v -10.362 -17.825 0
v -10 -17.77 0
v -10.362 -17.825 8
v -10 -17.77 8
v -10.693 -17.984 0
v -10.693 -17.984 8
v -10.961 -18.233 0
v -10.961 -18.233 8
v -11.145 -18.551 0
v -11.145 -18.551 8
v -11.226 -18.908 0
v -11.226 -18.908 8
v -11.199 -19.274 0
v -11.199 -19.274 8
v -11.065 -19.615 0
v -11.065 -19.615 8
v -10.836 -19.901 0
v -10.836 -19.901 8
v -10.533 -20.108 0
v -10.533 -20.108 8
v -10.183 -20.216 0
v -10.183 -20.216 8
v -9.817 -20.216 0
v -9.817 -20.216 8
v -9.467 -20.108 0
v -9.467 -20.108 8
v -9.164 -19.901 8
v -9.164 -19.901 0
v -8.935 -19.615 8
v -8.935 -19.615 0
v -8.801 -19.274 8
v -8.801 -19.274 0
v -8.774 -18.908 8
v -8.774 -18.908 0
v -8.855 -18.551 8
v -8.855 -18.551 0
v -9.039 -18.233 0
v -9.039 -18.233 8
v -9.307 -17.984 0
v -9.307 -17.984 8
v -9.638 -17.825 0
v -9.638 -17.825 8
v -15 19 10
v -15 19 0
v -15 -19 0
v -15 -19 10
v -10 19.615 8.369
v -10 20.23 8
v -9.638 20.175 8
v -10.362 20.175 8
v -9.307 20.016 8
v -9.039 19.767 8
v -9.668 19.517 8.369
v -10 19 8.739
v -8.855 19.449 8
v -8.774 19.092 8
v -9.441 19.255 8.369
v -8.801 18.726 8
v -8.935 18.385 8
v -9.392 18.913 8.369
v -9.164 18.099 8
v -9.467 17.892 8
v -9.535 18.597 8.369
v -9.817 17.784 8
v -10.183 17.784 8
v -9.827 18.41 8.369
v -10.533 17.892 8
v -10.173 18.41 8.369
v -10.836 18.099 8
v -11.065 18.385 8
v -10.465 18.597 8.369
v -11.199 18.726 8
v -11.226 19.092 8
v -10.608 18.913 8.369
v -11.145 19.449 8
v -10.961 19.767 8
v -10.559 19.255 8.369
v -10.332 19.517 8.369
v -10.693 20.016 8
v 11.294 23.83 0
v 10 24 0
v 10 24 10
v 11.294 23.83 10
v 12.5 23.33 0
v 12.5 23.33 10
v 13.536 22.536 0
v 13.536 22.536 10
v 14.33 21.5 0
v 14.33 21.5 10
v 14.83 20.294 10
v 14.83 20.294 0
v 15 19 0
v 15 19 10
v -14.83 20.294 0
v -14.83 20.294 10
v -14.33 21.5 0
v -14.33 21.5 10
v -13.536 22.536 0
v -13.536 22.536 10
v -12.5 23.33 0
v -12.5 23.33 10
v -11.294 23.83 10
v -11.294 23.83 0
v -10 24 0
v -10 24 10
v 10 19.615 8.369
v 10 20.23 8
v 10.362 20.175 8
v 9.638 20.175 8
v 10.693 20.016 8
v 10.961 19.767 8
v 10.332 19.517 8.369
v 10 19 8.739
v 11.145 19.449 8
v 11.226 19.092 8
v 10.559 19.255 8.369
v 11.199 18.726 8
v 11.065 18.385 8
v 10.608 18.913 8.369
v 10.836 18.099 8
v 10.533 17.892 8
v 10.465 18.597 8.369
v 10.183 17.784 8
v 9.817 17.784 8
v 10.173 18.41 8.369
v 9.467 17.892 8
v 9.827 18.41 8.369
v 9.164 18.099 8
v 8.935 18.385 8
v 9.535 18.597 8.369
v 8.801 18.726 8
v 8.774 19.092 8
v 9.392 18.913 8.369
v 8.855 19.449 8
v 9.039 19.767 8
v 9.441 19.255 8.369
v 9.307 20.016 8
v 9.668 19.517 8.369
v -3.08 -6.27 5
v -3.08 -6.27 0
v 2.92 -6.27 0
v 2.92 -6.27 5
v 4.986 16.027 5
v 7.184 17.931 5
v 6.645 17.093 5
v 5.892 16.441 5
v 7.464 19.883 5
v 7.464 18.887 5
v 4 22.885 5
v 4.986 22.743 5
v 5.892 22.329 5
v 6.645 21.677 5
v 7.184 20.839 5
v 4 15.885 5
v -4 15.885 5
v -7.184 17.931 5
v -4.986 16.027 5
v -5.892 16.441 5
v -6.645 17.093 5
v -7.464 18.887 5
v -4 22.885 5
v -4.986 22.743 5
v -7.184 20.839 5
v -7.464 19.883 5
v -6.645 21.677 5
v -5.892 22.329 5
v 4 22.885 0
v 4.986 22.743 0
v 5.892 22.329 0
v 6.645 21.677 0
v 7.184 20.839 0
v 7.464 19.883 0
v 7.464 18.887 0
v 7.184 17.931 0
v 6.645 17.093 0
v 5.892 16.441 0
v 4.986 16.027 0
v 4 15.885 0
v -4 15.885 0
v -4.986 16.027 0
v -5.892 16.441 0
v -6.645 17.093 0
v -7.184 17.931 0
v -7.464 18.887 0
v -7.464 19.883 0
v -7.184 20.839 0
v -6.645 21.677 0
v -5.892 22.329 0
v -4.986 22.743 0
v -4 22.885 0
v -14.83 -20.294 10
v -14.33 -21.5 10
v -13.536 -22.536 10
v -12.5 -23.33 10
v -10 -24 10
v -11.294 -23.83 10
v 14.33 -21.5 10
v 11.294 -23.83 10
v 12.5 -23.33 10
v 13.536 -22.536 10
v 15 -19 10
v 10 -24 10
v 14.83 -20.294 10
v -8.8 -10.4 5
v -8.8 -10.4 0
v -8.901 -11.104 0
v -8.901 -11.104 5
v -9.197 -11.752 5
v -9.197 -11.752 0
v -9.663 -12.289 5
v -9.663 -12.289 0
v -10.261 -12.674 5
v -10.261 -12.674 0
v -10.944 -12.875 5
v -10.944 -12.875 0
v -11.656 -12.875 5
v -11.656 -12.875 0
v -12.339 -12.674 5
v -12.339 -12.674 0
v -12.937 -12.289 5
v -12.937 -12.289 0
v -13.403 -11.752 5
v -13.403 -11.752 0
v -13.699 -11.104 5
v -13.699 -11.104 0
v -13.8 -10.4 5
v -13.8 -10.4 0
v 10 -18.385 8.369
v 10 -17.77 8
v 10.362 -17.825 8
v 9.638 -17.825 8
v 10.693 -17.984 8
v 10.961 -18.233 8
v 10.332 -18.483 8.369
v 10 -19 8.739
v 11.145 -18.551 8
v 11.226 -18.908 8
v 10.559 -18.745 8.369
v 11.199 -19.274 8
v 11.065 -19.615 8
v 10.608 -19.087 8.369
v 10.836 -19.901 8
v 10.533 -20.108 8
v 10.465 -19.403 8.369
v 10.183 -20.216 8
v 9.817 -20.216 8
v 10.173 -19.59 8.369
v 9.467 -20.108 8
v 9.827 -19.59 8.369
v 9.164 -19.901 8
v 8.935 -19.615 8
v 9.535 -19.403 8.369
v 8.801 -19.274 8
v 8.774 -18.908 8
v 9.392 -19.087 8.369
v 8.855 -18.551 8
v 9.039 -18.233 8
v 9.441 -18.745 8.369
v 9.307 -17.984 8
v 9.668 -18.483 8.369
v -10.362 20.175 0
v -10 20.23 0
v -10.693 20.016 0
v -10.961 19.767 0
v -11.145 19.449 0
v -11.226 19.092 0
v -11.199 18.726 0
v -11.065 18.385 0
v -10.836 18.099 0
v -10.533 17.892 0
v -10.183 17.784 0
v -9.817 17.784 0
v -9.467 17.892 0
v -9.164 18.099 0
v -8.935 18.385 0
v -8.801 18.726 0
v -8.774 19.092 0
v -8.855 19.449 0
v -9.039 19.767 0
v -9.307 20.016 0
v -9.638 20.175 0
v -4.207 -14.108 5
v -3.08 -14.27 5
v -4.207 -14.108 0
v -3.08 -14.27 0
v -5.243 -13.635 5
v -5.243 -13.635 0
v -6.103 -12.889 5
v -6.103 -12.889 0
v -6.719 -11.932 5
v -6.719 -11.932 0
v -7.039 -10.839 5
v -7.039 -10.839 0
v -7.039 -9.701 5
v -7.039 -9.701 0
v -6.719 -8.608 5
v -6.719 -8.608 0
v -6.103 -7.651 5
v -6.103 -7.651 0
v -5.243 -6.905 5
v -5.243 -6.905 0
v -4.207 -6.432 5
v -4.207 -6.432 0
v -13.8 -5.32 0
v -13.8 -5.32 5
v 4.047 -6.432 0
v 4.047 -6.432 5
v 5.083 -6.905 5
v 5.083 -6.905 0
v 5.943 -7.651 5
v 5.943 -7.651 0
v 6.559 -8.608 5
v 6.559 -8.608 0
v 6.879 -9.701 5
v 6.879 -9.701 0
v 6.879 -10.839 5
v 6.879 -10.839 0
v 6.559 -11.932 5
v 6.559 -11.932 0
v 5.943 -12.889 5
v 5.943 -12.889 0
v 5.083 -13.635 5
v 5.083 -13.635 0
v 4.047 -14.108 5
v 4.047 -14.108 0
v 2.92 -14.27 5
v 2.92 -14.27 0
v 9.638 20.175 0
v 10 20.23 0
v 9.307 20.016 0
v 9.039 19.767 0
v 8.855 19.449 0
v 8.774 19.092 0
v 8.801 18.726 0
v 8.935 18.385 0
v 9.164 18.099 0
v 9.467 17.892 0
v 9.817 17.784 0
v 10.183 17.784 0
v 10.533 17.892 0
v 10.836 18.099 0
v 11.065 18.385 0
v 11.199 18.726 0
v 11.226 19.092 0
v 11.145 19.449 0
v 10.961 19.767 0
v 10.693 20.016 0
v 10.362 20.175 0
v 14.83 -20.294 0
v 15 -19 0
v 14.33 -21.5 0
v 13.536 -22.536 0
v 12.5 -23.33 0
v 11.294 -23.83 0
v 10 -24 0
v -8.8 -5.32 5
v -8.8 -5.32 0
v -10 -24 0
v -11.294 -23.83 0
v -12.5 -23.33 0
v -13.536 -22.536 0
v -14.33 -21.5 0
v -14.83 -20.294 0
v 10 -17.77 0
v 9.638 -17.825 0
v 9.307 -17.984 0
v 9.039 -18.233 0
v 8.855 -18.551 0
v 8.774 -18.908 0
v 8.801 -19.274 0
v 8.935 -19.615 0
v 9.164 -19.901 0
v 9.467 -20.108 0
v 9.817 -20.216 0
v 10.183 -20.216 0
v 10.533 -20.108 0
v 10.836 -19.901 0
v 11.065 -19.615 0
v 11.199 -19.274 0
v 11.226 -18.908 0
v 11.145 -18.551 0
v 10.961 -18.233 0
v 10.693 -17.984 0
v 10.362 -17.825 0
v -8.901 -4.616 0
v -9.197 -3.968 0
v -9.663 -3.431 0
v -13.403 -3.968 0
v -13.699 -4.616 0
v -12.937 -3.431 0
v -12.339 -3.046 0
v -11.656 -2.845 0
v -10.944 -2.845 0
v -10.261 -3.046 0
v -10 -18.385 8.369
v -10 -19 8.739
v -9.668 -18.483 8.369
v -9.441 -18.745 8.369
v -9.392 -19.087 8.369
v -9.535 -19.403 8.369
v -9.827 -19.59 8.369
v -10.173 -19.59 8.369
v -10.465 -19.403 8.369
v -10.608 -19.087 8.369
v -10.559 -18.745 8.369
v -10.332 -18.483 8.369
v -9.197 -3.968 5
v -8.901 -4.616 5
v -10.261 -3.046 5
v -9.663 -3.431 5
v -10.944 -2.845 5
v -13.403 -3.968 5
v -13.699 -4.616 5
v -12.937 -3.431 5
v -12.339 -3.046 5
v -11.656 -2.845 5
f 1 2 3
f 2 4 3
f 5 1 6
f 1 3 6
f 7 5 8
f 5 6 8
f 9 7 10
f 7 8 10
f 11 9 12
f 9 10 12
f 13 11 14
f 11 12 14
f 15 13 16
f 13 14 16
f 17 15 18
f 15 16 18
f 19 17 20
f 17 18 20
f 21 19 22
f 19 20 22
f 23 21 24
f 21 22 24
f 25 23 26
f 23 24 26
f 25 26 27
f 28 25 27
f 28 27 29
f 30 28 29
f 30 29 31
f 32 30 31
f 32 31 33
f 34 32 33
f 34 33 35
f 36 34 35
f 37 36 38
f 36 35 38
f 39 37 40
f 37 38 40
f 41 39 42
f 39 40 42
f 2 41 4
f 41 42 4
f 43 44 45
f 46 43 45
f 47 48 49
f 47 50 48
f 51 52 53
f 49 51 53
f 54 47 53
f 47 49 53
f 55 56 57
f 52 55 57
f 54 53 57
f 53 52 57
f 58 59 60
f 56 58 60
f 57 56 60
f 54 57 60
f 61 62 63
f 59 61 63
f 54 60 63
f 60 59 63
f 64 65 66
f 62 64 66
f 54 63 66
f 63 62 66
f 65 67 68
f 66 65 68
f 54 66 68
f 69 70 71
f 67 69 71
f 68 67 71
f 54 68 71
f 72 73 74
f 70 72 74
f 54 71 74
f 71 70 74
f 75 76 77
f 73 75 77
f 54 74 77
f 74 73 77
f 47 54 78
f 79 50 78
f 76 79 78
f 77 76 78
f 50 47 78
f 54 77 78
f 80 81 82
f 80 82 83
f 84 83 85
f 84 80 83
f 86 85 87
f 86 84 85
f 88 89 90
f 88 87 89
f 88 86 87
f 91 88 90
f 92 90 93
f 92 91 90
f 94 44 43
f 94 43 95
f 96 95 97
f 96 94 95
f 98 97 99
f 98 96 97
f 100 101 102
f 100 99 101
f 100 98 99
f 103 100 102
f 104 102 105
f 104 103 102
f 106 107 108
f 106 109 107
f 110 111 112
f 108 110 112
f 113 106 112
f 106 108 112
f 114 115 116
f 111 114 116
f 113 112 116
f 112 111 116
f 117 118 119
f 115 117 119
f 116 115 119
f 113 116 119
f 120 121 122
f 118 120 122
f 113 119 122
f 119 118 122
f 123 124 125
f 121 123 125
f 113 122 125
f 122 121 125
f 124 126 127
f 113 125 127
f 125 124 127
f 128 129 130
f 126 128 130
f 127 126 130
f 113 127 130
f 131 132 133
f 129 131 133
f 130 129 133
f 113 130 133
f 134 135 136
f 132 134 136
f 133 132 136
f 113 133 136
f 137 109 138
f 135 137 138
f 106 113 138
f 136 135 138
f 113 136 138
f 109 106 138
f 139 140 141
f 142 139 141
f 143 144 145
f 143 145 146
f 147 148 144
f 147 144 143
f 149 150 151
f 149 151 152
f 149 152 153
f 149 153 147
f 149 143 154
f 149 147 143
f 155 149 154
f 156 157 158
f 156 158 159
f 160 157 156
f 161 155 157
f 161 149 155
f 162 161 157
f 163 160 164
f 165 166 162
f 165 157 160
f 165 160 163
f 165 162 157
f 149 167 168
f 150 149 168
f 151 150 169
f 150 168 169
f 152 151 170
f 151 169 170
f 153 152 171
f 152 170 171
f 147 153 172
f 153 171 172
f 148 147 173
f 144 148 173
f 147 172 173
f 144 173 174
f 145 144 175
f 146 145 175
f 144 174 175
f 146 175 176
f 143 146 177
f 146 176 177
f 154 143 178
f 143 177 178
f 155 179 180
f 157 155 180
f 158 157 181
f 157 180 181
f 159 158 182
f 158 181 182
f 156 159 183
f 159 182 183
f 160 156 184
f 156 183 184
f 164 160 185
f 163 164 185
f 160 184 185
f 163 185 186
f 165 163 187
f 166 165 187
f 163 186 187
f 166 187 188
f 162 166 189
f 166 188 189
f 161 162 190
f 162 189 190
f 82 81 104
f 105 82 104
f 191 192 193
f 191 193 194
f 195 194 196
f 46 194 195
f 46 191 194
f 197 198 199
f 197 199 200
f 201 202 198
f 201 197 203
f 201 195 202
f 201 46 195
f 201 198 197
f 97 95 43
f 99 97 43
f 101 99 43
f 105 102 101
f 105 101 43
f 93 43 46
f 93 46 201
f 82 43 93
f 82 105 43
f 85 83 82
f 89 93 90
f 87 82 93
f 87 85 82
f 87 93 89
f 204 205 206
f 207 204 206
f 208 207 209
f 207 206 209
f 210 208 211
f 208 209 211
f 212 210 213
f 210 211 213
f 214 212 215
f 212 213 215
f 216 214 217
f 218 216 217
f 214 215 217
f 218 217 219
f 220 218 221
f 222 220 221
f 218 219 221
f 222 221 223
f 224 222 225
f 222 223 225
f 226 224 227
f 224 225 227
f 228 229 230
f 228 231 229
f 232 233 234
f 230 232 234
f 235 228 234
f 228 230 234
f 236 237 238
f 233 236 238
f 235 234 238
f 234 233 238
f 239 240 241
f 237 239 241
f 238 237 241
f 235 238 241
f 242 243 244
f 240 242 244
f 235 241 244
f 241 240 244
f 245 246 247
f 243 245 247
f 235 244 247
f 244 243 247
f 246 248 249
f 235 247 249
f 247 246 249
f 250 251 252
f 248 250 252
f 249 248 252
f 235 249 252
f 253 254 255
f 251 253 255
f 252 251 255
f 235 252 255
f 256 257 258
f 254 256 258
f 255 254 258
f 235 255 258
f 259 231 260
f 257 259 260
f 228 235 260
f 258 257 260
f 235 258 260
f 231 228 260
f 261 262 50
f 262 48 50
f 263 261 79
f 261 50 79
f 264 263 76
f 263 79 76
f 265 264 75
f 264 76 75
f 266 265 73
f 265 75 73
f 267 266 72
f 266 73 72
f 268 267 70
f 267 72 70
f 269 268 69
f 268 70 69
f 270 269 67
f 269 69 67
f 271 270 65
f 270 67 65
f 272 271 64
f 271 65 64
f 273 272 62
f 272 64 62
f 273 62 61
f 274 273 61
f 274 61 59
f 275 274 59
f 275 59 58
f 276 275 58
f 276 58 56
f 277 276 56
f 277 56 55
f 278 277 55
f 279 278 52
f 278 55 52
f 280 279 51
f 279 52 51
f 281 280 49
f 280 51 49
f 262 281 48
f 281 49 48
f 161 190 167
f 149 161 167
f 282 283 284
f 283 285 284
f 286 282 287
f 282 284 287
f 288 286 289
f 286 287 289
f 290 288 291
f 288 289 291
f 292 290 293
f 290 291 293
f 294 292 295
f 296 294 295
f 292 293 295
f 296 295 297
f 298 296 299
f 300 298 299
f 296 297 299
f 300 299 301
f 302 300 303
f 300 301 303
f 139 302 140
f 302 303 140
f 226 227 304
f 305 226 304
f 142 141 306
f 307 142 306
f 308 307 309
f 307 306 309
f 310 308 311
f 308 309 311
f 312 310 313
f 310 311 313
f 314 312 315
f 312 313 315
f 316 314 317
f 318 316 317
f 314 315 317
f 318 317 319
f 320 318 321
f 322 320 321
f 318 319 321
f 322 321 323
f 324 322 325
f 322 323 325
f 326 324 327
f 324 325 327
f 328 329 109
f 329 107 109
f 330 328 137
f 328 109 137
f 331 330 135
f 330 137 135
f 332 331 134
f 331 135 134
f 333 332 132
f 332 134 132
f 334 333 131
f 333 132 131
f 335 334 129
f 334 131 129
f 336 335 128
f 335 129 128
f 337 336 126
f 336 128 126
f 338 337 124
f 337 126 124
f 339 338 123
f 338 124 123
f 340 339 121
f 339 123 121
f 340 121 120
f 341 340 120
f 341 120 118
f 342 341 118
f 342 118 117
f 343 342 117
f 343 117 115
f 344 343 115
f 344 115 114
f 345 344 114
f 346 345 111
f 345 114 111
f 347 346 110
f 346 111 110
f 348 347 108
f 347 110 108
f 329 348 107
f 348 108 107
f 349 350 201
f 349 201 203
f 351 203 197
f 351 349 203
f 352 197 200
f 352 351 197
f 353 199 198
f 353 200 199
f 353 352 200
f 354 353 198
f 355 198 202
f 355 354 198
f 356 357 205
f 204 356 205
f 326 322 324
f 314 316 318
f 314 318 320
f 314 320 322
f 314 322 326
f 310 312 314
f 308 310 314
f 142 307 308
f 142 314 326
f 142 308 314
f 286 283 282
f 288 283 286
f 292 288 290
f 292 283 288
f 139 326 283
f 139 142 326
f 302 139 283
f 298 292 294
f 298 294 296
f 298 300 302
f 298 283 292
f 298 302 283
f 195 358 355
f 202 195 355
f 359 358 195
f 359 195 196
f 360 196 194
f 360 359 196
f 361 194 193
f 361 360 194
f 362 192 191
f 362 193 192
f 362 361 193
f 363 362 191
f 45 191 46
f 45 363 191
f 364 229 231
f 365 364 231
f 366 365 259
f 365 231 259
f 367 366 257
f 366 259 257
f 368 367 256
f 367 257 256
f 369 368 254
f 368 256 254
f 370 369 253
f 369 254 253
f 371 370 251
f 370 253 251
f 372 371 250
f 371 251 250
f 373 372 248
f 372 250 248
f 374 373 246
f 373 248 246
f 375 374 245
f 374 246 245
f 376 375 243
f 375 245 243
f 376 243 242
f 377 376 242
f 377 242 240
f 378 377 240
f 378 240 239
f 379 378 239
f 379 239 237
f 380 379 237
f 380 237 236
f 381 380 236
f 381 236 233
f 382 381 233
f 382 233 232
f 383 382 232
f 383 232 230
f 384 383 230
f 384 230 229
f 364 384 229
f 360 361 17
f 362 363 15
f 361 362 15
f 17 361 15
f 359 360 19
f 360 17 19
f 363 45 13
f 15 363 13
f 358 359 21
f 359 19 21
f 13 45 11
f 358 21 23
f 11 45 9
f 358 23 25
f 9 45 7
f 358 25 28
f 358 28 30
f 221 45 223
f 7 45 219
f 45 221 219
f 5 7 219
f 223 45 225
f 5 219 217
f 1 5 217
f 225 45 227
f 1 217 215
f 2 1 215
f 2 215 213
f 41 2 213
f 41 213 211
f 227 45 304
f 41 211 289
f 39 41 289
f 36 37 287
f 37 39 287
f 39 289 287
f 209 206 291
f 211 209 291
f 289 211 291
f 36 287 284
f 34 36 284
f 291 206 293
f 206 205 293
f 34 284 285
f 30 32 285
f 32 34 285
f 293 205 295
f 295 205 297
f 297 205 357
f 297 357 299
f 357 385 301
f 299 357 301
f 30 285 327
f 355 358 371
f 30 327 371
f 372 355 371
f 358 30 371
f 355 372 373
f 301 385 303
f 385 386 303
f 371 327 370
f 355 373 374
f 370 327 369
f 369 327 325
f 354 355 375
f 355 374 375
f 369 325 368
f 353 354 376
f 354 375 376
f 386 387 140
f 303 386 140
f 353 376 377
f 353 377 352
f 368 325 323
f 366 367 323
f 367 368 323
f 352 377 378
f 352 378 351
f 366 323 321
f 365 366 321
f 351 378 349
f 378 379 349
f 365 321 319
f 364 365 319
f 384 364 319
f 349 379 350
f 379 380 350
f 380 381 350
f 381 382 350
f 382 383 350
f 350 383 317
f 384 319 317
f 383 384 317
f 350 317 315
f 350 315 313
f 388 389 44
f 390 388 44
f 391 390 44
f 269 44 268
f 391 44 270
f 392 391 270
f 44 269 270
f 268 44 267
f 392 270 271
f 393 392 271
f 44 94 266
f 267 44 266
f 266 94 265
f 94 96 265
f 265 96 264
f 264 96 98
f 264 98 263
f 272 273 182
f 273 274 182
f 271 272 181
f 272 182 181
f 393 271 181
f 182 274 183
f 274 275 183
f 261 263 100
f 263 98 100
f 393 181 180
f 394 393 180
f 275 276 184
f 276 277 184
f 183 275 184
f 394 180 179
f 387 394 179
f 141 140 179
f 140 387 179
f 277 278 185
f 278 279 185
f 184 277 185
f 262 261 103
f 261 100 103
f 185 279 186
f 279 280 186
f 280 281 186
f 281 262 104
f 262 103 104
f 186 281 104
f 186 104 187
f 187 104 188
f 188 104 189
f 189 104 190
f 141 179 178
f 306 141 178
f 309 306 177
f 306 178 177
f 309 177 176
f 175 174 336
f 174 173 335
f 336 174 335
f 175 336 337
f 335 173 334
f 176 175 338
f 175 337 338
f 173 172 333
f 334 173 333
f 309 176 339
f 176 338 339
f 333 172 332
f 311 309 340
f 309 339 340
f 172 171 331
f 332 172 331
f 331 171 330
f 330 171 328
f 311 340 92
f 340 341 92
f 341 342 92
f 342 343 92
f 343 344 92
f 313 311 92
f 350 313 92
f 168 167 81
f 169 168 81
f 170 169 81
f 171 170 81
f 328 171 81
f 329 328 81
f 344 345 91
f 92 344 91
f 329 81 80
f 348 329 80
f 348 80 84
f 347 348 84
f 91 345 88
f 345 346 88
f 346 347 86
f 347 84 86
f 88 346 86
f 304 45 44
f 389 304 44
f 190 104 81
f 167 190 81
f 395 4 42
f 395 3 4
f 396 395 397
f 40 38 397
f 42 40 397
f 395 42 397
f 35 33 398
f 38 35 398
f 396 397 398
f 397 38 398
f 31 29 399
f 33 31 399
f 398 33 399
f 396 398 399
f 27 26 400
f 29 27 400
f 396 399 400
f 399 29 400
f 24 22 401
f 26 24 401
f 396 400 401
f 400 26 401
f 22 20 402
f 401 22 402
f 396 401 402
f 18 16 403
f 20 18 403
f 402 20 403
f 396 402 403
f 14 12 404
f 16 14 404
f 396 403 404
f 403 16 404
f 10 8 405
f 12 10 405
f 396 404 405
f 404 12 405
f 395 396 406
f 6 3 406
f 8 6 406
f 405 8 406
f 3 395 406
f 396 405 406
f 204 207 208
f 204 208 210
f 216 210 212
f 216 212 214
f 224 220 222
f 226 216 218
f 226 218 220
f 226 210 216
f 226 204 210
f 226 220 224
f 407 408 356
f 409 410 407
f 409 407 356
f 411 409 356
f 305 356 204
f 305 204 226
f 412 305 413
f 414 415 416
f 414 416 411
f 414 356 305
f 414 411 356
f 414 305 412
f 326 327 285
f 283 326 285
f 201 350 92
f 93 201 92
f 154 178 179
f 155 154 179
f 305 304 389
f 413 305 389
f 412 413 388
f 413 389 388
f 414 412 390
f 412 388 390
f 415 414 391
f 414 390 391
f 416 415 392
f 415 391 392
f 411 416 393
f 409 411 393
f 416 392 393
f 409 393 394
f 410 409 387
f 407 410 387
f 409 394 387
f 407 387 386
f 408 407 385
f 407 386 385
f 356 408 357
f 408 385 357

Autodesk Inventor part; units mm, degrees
ref_plane "YZ Plane" through (0, 0, 0) normal (1, 0, 0) x (0, 1, 0)
ref_plane "XZ Plane" through (0, 0, 0) normal (0, 1, 0) x (-1, 0, 0)
ref_plane "XY Plane" through (0, 0, 0) normal (0, 0, 1) x (1, 0, 0)
sketch "Sketch1" plane through (0, 0, 0) normal (0, 0, 1) x (1, 0, 0)
  line L0 (-15, 19) -> (-15, -19) projected
  arc A0 (-10, 24) -> (-15, 19) centre (-10, 19) ccw projected
  line L1 (10, 24) -> (-10, 24) projected
  arc A1 (15, 19) -> (10, 24) centre (10, 19) ccw projected
  line L2 (15, -19) -> (15, 19) projected
  arc A2 (10, -24) -> (15, -19) centre (10, -19) ccw projected
  line L3 (-10, -24) -> (10, -24) projected
  arc A3 (-15, -19) -> (-10, -24) centre (-10, -19) ccw projected
  point P0 (0, 0)
extrude "Extrusion1" add sketch "Sketch1" along normal blind 10
sketch "Sketch2" plane through (0, 0, 0) normal (0, 0, -1) x (-1, 0, 0)
  circle A0 centre (-10, 19) radius 1.6 projected
  circle A1 centre (-10, -19) radius 1.6 projected
  arc A2 (10, -24) -> (15, -19) centre (10, -19) ccw projected
  line L0 (15, 19) -> (15, -19) projected
  arc A3 (15, 19) -> (10, 24) centre (10, 19) ccw projected
  line L1 (-10, 24) -> (10, 24) projected
  arc A4 (-10, 24) -> (-15, 19) centre (-10, 19) ccw projected
  line L2 (-15, -19) -> (-15, 19) projected
  arc A5 (-15, -19) -> (-10, -24) centre (-10, -19) ccw projected
  line L3 (10, -24) -> (-10, -24) projected
  circle A6 centre (10, -19) radius 1.6 projected
  circle A7 centre (10, 19) radius 1.6 projected
hole "Hole1" at (10, 19, 0) at (10, -19, 0) at (-10, -19, 0) at (-10, 19, 0) direction (0, 0, 1) diameter 2.459 depth 8 tip angle 118 thread size "M3x0.5" class "6H" standard "ANSI Metric M Profile"
sketch "Sketch3" plane through (0, 0, 0) normal (0, 0, -1) x (-1, 0, 0)
  circle A0 centre (10, 19) radius 1.2295 construction
  circle A1 centre (10, -19) radius 1.2295 construction
  circle A2 centre (-10, -19) radius 1.2295 construction
  circle A3 centre (-10, 19) radius 1.2295 construction
  arc A4 (10, -24) -> (15, -19) centre (10, -19) ccw projected
  line L0 (15, 19) -> (15, -19) projected
  arc A5 (15, 19) -> (10, 24) centre (10, 19) ccw projected
  line L1 (-10, 24) -> (10, 24) projected
  arc A6 (-10, 24) -> (-15, 19) centre (-10, 19) ccw projected
  line L2 (-15, -19) -> (-15, 19) projected
  arc A7 (-15, -19) -> (-10, -24) centre (-10, -19) ccw projected
  line L3 (10, -24) -> (-10, -24) projected
  arc A8 (15, 19) -> (10, 24) centre (10, 19) ccw projected
  line L4 (-10, 24) -> (10, 24) projected
  arc A9 (-10, 24) -> (-15, 19) centre (-10, 19) ccw projected
  line L5 (-15, -19) -> (-15, 19) projected
  arc A10 (-15, -19) -> (-10, -24) centre (-10, -19) ccw projected
  line L6 (10, -24) -> (-10, -24) projected
  arc A11 (10, -24) -> (15, -19) centre (10, -19) ccw projected
  line L7 (15, 19) -> (15, -19) projected
  circle A12 centre (11.6971, -20.6971) radius 0.25 construction
  circle A13 centre (12.4, -19) radius 0.25 construction
  circle A14 centre (10, -21.4) radius 0.25 construction
  circle A15 centre (10, -19) radius 1.6 construction
  circle A16 centre (11.6971, -17.3029) radius 0.25 construction
  circle A17 centre (10, -16.6) radius 0.25 construction
  circle A18 centre (8.3029, -20.6971) radius 0.25 construction
  circle A19 centre (7.6, -19) radius 0.25 construction
  circle A20 centre (8.3029, -17.3029) radius 0.25 construction
  circle A21 centre (2.62, -11.54) radius 0.5 construction
  circle A22 centre (0.08, -11.54) radius 0.5 construction
  circle A23 centre (11.3, -10.4) radius 0.4953 construction
  circle A24 centre (12.316, -5.32) radius 0.4953 construction
  circle A25 centre (10.284, -5.32) radius 0.4953 construction
  circle A26 centre (2.62, -9) radius 0.5 construction
  circle A27 centre (0.08, -9) radius 0.5 construction
  circle A28 centre (-2.46, -11.54) radius 0.5 construction
  circle A29 centre (-8.3029, -20.6971) radius 0.25 construction
  circle A30 centre (-7.6, -19) radius 0.25 construction
  circle A31 centre (-10, -21.4) radius 0.25 construction
  circle A32 centre (-10, -19) radius 1.6 construction
  circle A33 centre (-8.3029, -17.3029) radius 0.25 construction
  circle A34 centre (-10, -16.6) radius 0.25 construction
  circle A35 centre (-11.6971, -20.6971) radius 0.25 construction
  circle A36 centre (-12.4, -19) radius 0.25 construction
  circle A37 centre (-11.6971, -17.3029) radius 0.25 construction
  circle A38 centre (-2.46, -9) radius 0.5 construction
  circle A39 centre (-13.3, -3.2) radius 0.45 construction
  circle A40 centre (-13.3, -0.2) radius 0.45 construction
  circle A41 centre (10.7, 8.9) radius 0.1 construction
  circle A42 centre (9.85, 8.9) radius 0.1 construction
  circle A43 centre (10.7, 9.7) radius 0.1 construction
  circle A44 centre (9.85, 9.7) radius 0.1 construction
  circle A45 centre (9, 8.9) radius 0.1 construction
  circle A46 centre (9, 9.7) radius 0.1 construction
  circle A47 centre (11.6971, 17.3029) radius 0.25 construction
  circle A48 centre (12.4, 19) radius 0.25 construction
  circle A49 centre (10, 16.6) radius 0.25 construction
  circle A50 centre (10, 19) radius 1.6 construction
  circle A51 centre (11.6971, 20.6971) radius 0.25 construction
  circle A52 centre (10, 21.4) radius 0.25 construction
  circle A53 centre (8.3029, 17.3029) radius 0.25 construction
  circle A54 centre (7.6, 19) radius 0.25 construction
  circle A55 centre (8.3029, 20.6971) radius 0.25 construction
  arc A56 (4.02, 16.62) -> (4.62, 16.62) centre (4.32, 16.62) ccw construction
  line L8 (4.02, 17.72) -> (4.02, 16.62) construction
  arc A57 (4.62, 17.72) -> (4.02, 17.72) centre (4.32, 17.72) ccw construction
  line L9 (4.62, 16.62) -> (4.62, 17.72) construction
  circle A58 centre (2.89, 17.7) radius 0.325 construction
  arc A59 (4.02, 21.05) -> (4.62, 21.05) centre (4.32, 21.05) ccw construction
  line L10 (4.02, 21.65) -> (4.02, 21.05) construction
  arc A60 (4.62, 21.65) -> (4.02, 21.65) centre (4.32, 21.65) ccw construction
  line L11 (4.62, 21.05) -> (4.62, 21.65) construction
  circle A61 centre (-2.89, 17.7) radius 0.325 construction
  arc A62 (-4.62, 16.62) -> (-4.02, 16.62) centre (-4.32, 16.62) ccw construction
  line L12 (-4.62, 17.72) -> (-4.62, 16.62) construction
  arc A63 (-4.02, 17.72) -> (-4.62, 17.72) centre (-4.32, 17.72) ccw construction
  line L13 (-4.02, 16.62) -> (-4.02, 17.72) construction
  arc A64 (-4.62, 21.05) -> (-4.02, 21.05) centre (-4.32, 21.05) ccw construction
  line L14 (-4.62, 21.65) -> (-4.62, 21.05) construction
  arc A65 (-4.02, 21.65) -> (-4.62, 21.65) centre (-4.32, 21.65) ccw construction
  line L15 (-4.02, 21.05) -> (-4.02, 21.65) construction
  circle A66 centre (-8.3029, 17.3029) radius 0.25 construction
  circle A67 centre (-7.6, 19) radius 0.25 construction
  circle A68 centre (-10, 16.6) radius 0.25 construction
  circle A69 centre (-10, 19) radius 1.6 construction
  circle A70 centre (-8.3029, 20.6971) radius 0.25 construction
  circle A71 centre (-10, 21.4) radius 0.25 construction
  circle A72 centre (-11.6971, 17.3029) radius 0.25 construction
  circle A73 centre (-12.4, 19) radius 0.25 construction
  circle A74 centre (-11.6971, 20.6971) radius 0.25 construction
  line L16 (11.3, -10.4) -> (11.3, -5.32) construction
  line L17 (13.8, -10.4) -> (13.8, -5.32)
  line L18 (8.8, -5.32) -> (8.8, -10.4)
  arc A75 (8.8, -10.4) -> (13.8, -10.4) centre (11.3, -10.4) ccw
  arc A76 (13.8, -5.32) -> (8.8, -5.32) centre (11.3, -5.32) ccw
  line L19 (11.3, -5.32) -> (12.316, -5.32) construction
  line L20 (-4.32, 17.72) -> (4.32, 17.72) construction
  line L21 (4.32, 21.05) -> (-4.32, 21.05) construction
  line L22 (0, 17.72) -> (0, 21.05) construction
  line L23 (-4, 19.385) -> (4, 19.385) construction
  line L24 (-4, 15.885) -> (4, 15.885)
  line L25 (4, 22.885) -> (-4, 22.885)
  arc A77 (-4, 22.885) -> (-4, 15.885) centre (-4, 19.385) ccw
  arc A78 (4, 15.885) -> (4, 22.885) centre (4, 19.385) ccw
  line L26 (-2.46, -11.54) -> (2.62, -9) construction
  line L27 (2.62, -11.54) -> (-2.46, -9) construction
  line L28 (-2.92, -10.27) -> (3.08, -10.27) construction
  line L29 (-2.92, -14.27) -> (3.08, -14.27)
  line L30 (3.08, -6.27) -> (-2.92, -6.27)
  arc A79 (-2.92, -6.27) -> (-2.92, -14.27) centre (-2.92, -10.27) ccw
  arc A80 (3.08, -14.27) -> (3.08, -6.27) centre (3.08, -10.27) ccw
  point P0 (0, 0)
  point P1 (11.3, -7.86)
  point P2 (0, 19.385)
  point P3 (0.08, -10.27)
  dimension "d10" = 5
  dimension "d16" = 4
  dimension "d17" = 7
  dimension "d18" = 3
  dimension "d19" = 8
extrude "Extrusion2" cut sketch "Sketch3" against normal blind 5 contours A75 L18 A76 L17 | A77 L25 A78 L24 | A79 L30 A80 L29
properties part number "Backplate" material "Aluminum 6061"
